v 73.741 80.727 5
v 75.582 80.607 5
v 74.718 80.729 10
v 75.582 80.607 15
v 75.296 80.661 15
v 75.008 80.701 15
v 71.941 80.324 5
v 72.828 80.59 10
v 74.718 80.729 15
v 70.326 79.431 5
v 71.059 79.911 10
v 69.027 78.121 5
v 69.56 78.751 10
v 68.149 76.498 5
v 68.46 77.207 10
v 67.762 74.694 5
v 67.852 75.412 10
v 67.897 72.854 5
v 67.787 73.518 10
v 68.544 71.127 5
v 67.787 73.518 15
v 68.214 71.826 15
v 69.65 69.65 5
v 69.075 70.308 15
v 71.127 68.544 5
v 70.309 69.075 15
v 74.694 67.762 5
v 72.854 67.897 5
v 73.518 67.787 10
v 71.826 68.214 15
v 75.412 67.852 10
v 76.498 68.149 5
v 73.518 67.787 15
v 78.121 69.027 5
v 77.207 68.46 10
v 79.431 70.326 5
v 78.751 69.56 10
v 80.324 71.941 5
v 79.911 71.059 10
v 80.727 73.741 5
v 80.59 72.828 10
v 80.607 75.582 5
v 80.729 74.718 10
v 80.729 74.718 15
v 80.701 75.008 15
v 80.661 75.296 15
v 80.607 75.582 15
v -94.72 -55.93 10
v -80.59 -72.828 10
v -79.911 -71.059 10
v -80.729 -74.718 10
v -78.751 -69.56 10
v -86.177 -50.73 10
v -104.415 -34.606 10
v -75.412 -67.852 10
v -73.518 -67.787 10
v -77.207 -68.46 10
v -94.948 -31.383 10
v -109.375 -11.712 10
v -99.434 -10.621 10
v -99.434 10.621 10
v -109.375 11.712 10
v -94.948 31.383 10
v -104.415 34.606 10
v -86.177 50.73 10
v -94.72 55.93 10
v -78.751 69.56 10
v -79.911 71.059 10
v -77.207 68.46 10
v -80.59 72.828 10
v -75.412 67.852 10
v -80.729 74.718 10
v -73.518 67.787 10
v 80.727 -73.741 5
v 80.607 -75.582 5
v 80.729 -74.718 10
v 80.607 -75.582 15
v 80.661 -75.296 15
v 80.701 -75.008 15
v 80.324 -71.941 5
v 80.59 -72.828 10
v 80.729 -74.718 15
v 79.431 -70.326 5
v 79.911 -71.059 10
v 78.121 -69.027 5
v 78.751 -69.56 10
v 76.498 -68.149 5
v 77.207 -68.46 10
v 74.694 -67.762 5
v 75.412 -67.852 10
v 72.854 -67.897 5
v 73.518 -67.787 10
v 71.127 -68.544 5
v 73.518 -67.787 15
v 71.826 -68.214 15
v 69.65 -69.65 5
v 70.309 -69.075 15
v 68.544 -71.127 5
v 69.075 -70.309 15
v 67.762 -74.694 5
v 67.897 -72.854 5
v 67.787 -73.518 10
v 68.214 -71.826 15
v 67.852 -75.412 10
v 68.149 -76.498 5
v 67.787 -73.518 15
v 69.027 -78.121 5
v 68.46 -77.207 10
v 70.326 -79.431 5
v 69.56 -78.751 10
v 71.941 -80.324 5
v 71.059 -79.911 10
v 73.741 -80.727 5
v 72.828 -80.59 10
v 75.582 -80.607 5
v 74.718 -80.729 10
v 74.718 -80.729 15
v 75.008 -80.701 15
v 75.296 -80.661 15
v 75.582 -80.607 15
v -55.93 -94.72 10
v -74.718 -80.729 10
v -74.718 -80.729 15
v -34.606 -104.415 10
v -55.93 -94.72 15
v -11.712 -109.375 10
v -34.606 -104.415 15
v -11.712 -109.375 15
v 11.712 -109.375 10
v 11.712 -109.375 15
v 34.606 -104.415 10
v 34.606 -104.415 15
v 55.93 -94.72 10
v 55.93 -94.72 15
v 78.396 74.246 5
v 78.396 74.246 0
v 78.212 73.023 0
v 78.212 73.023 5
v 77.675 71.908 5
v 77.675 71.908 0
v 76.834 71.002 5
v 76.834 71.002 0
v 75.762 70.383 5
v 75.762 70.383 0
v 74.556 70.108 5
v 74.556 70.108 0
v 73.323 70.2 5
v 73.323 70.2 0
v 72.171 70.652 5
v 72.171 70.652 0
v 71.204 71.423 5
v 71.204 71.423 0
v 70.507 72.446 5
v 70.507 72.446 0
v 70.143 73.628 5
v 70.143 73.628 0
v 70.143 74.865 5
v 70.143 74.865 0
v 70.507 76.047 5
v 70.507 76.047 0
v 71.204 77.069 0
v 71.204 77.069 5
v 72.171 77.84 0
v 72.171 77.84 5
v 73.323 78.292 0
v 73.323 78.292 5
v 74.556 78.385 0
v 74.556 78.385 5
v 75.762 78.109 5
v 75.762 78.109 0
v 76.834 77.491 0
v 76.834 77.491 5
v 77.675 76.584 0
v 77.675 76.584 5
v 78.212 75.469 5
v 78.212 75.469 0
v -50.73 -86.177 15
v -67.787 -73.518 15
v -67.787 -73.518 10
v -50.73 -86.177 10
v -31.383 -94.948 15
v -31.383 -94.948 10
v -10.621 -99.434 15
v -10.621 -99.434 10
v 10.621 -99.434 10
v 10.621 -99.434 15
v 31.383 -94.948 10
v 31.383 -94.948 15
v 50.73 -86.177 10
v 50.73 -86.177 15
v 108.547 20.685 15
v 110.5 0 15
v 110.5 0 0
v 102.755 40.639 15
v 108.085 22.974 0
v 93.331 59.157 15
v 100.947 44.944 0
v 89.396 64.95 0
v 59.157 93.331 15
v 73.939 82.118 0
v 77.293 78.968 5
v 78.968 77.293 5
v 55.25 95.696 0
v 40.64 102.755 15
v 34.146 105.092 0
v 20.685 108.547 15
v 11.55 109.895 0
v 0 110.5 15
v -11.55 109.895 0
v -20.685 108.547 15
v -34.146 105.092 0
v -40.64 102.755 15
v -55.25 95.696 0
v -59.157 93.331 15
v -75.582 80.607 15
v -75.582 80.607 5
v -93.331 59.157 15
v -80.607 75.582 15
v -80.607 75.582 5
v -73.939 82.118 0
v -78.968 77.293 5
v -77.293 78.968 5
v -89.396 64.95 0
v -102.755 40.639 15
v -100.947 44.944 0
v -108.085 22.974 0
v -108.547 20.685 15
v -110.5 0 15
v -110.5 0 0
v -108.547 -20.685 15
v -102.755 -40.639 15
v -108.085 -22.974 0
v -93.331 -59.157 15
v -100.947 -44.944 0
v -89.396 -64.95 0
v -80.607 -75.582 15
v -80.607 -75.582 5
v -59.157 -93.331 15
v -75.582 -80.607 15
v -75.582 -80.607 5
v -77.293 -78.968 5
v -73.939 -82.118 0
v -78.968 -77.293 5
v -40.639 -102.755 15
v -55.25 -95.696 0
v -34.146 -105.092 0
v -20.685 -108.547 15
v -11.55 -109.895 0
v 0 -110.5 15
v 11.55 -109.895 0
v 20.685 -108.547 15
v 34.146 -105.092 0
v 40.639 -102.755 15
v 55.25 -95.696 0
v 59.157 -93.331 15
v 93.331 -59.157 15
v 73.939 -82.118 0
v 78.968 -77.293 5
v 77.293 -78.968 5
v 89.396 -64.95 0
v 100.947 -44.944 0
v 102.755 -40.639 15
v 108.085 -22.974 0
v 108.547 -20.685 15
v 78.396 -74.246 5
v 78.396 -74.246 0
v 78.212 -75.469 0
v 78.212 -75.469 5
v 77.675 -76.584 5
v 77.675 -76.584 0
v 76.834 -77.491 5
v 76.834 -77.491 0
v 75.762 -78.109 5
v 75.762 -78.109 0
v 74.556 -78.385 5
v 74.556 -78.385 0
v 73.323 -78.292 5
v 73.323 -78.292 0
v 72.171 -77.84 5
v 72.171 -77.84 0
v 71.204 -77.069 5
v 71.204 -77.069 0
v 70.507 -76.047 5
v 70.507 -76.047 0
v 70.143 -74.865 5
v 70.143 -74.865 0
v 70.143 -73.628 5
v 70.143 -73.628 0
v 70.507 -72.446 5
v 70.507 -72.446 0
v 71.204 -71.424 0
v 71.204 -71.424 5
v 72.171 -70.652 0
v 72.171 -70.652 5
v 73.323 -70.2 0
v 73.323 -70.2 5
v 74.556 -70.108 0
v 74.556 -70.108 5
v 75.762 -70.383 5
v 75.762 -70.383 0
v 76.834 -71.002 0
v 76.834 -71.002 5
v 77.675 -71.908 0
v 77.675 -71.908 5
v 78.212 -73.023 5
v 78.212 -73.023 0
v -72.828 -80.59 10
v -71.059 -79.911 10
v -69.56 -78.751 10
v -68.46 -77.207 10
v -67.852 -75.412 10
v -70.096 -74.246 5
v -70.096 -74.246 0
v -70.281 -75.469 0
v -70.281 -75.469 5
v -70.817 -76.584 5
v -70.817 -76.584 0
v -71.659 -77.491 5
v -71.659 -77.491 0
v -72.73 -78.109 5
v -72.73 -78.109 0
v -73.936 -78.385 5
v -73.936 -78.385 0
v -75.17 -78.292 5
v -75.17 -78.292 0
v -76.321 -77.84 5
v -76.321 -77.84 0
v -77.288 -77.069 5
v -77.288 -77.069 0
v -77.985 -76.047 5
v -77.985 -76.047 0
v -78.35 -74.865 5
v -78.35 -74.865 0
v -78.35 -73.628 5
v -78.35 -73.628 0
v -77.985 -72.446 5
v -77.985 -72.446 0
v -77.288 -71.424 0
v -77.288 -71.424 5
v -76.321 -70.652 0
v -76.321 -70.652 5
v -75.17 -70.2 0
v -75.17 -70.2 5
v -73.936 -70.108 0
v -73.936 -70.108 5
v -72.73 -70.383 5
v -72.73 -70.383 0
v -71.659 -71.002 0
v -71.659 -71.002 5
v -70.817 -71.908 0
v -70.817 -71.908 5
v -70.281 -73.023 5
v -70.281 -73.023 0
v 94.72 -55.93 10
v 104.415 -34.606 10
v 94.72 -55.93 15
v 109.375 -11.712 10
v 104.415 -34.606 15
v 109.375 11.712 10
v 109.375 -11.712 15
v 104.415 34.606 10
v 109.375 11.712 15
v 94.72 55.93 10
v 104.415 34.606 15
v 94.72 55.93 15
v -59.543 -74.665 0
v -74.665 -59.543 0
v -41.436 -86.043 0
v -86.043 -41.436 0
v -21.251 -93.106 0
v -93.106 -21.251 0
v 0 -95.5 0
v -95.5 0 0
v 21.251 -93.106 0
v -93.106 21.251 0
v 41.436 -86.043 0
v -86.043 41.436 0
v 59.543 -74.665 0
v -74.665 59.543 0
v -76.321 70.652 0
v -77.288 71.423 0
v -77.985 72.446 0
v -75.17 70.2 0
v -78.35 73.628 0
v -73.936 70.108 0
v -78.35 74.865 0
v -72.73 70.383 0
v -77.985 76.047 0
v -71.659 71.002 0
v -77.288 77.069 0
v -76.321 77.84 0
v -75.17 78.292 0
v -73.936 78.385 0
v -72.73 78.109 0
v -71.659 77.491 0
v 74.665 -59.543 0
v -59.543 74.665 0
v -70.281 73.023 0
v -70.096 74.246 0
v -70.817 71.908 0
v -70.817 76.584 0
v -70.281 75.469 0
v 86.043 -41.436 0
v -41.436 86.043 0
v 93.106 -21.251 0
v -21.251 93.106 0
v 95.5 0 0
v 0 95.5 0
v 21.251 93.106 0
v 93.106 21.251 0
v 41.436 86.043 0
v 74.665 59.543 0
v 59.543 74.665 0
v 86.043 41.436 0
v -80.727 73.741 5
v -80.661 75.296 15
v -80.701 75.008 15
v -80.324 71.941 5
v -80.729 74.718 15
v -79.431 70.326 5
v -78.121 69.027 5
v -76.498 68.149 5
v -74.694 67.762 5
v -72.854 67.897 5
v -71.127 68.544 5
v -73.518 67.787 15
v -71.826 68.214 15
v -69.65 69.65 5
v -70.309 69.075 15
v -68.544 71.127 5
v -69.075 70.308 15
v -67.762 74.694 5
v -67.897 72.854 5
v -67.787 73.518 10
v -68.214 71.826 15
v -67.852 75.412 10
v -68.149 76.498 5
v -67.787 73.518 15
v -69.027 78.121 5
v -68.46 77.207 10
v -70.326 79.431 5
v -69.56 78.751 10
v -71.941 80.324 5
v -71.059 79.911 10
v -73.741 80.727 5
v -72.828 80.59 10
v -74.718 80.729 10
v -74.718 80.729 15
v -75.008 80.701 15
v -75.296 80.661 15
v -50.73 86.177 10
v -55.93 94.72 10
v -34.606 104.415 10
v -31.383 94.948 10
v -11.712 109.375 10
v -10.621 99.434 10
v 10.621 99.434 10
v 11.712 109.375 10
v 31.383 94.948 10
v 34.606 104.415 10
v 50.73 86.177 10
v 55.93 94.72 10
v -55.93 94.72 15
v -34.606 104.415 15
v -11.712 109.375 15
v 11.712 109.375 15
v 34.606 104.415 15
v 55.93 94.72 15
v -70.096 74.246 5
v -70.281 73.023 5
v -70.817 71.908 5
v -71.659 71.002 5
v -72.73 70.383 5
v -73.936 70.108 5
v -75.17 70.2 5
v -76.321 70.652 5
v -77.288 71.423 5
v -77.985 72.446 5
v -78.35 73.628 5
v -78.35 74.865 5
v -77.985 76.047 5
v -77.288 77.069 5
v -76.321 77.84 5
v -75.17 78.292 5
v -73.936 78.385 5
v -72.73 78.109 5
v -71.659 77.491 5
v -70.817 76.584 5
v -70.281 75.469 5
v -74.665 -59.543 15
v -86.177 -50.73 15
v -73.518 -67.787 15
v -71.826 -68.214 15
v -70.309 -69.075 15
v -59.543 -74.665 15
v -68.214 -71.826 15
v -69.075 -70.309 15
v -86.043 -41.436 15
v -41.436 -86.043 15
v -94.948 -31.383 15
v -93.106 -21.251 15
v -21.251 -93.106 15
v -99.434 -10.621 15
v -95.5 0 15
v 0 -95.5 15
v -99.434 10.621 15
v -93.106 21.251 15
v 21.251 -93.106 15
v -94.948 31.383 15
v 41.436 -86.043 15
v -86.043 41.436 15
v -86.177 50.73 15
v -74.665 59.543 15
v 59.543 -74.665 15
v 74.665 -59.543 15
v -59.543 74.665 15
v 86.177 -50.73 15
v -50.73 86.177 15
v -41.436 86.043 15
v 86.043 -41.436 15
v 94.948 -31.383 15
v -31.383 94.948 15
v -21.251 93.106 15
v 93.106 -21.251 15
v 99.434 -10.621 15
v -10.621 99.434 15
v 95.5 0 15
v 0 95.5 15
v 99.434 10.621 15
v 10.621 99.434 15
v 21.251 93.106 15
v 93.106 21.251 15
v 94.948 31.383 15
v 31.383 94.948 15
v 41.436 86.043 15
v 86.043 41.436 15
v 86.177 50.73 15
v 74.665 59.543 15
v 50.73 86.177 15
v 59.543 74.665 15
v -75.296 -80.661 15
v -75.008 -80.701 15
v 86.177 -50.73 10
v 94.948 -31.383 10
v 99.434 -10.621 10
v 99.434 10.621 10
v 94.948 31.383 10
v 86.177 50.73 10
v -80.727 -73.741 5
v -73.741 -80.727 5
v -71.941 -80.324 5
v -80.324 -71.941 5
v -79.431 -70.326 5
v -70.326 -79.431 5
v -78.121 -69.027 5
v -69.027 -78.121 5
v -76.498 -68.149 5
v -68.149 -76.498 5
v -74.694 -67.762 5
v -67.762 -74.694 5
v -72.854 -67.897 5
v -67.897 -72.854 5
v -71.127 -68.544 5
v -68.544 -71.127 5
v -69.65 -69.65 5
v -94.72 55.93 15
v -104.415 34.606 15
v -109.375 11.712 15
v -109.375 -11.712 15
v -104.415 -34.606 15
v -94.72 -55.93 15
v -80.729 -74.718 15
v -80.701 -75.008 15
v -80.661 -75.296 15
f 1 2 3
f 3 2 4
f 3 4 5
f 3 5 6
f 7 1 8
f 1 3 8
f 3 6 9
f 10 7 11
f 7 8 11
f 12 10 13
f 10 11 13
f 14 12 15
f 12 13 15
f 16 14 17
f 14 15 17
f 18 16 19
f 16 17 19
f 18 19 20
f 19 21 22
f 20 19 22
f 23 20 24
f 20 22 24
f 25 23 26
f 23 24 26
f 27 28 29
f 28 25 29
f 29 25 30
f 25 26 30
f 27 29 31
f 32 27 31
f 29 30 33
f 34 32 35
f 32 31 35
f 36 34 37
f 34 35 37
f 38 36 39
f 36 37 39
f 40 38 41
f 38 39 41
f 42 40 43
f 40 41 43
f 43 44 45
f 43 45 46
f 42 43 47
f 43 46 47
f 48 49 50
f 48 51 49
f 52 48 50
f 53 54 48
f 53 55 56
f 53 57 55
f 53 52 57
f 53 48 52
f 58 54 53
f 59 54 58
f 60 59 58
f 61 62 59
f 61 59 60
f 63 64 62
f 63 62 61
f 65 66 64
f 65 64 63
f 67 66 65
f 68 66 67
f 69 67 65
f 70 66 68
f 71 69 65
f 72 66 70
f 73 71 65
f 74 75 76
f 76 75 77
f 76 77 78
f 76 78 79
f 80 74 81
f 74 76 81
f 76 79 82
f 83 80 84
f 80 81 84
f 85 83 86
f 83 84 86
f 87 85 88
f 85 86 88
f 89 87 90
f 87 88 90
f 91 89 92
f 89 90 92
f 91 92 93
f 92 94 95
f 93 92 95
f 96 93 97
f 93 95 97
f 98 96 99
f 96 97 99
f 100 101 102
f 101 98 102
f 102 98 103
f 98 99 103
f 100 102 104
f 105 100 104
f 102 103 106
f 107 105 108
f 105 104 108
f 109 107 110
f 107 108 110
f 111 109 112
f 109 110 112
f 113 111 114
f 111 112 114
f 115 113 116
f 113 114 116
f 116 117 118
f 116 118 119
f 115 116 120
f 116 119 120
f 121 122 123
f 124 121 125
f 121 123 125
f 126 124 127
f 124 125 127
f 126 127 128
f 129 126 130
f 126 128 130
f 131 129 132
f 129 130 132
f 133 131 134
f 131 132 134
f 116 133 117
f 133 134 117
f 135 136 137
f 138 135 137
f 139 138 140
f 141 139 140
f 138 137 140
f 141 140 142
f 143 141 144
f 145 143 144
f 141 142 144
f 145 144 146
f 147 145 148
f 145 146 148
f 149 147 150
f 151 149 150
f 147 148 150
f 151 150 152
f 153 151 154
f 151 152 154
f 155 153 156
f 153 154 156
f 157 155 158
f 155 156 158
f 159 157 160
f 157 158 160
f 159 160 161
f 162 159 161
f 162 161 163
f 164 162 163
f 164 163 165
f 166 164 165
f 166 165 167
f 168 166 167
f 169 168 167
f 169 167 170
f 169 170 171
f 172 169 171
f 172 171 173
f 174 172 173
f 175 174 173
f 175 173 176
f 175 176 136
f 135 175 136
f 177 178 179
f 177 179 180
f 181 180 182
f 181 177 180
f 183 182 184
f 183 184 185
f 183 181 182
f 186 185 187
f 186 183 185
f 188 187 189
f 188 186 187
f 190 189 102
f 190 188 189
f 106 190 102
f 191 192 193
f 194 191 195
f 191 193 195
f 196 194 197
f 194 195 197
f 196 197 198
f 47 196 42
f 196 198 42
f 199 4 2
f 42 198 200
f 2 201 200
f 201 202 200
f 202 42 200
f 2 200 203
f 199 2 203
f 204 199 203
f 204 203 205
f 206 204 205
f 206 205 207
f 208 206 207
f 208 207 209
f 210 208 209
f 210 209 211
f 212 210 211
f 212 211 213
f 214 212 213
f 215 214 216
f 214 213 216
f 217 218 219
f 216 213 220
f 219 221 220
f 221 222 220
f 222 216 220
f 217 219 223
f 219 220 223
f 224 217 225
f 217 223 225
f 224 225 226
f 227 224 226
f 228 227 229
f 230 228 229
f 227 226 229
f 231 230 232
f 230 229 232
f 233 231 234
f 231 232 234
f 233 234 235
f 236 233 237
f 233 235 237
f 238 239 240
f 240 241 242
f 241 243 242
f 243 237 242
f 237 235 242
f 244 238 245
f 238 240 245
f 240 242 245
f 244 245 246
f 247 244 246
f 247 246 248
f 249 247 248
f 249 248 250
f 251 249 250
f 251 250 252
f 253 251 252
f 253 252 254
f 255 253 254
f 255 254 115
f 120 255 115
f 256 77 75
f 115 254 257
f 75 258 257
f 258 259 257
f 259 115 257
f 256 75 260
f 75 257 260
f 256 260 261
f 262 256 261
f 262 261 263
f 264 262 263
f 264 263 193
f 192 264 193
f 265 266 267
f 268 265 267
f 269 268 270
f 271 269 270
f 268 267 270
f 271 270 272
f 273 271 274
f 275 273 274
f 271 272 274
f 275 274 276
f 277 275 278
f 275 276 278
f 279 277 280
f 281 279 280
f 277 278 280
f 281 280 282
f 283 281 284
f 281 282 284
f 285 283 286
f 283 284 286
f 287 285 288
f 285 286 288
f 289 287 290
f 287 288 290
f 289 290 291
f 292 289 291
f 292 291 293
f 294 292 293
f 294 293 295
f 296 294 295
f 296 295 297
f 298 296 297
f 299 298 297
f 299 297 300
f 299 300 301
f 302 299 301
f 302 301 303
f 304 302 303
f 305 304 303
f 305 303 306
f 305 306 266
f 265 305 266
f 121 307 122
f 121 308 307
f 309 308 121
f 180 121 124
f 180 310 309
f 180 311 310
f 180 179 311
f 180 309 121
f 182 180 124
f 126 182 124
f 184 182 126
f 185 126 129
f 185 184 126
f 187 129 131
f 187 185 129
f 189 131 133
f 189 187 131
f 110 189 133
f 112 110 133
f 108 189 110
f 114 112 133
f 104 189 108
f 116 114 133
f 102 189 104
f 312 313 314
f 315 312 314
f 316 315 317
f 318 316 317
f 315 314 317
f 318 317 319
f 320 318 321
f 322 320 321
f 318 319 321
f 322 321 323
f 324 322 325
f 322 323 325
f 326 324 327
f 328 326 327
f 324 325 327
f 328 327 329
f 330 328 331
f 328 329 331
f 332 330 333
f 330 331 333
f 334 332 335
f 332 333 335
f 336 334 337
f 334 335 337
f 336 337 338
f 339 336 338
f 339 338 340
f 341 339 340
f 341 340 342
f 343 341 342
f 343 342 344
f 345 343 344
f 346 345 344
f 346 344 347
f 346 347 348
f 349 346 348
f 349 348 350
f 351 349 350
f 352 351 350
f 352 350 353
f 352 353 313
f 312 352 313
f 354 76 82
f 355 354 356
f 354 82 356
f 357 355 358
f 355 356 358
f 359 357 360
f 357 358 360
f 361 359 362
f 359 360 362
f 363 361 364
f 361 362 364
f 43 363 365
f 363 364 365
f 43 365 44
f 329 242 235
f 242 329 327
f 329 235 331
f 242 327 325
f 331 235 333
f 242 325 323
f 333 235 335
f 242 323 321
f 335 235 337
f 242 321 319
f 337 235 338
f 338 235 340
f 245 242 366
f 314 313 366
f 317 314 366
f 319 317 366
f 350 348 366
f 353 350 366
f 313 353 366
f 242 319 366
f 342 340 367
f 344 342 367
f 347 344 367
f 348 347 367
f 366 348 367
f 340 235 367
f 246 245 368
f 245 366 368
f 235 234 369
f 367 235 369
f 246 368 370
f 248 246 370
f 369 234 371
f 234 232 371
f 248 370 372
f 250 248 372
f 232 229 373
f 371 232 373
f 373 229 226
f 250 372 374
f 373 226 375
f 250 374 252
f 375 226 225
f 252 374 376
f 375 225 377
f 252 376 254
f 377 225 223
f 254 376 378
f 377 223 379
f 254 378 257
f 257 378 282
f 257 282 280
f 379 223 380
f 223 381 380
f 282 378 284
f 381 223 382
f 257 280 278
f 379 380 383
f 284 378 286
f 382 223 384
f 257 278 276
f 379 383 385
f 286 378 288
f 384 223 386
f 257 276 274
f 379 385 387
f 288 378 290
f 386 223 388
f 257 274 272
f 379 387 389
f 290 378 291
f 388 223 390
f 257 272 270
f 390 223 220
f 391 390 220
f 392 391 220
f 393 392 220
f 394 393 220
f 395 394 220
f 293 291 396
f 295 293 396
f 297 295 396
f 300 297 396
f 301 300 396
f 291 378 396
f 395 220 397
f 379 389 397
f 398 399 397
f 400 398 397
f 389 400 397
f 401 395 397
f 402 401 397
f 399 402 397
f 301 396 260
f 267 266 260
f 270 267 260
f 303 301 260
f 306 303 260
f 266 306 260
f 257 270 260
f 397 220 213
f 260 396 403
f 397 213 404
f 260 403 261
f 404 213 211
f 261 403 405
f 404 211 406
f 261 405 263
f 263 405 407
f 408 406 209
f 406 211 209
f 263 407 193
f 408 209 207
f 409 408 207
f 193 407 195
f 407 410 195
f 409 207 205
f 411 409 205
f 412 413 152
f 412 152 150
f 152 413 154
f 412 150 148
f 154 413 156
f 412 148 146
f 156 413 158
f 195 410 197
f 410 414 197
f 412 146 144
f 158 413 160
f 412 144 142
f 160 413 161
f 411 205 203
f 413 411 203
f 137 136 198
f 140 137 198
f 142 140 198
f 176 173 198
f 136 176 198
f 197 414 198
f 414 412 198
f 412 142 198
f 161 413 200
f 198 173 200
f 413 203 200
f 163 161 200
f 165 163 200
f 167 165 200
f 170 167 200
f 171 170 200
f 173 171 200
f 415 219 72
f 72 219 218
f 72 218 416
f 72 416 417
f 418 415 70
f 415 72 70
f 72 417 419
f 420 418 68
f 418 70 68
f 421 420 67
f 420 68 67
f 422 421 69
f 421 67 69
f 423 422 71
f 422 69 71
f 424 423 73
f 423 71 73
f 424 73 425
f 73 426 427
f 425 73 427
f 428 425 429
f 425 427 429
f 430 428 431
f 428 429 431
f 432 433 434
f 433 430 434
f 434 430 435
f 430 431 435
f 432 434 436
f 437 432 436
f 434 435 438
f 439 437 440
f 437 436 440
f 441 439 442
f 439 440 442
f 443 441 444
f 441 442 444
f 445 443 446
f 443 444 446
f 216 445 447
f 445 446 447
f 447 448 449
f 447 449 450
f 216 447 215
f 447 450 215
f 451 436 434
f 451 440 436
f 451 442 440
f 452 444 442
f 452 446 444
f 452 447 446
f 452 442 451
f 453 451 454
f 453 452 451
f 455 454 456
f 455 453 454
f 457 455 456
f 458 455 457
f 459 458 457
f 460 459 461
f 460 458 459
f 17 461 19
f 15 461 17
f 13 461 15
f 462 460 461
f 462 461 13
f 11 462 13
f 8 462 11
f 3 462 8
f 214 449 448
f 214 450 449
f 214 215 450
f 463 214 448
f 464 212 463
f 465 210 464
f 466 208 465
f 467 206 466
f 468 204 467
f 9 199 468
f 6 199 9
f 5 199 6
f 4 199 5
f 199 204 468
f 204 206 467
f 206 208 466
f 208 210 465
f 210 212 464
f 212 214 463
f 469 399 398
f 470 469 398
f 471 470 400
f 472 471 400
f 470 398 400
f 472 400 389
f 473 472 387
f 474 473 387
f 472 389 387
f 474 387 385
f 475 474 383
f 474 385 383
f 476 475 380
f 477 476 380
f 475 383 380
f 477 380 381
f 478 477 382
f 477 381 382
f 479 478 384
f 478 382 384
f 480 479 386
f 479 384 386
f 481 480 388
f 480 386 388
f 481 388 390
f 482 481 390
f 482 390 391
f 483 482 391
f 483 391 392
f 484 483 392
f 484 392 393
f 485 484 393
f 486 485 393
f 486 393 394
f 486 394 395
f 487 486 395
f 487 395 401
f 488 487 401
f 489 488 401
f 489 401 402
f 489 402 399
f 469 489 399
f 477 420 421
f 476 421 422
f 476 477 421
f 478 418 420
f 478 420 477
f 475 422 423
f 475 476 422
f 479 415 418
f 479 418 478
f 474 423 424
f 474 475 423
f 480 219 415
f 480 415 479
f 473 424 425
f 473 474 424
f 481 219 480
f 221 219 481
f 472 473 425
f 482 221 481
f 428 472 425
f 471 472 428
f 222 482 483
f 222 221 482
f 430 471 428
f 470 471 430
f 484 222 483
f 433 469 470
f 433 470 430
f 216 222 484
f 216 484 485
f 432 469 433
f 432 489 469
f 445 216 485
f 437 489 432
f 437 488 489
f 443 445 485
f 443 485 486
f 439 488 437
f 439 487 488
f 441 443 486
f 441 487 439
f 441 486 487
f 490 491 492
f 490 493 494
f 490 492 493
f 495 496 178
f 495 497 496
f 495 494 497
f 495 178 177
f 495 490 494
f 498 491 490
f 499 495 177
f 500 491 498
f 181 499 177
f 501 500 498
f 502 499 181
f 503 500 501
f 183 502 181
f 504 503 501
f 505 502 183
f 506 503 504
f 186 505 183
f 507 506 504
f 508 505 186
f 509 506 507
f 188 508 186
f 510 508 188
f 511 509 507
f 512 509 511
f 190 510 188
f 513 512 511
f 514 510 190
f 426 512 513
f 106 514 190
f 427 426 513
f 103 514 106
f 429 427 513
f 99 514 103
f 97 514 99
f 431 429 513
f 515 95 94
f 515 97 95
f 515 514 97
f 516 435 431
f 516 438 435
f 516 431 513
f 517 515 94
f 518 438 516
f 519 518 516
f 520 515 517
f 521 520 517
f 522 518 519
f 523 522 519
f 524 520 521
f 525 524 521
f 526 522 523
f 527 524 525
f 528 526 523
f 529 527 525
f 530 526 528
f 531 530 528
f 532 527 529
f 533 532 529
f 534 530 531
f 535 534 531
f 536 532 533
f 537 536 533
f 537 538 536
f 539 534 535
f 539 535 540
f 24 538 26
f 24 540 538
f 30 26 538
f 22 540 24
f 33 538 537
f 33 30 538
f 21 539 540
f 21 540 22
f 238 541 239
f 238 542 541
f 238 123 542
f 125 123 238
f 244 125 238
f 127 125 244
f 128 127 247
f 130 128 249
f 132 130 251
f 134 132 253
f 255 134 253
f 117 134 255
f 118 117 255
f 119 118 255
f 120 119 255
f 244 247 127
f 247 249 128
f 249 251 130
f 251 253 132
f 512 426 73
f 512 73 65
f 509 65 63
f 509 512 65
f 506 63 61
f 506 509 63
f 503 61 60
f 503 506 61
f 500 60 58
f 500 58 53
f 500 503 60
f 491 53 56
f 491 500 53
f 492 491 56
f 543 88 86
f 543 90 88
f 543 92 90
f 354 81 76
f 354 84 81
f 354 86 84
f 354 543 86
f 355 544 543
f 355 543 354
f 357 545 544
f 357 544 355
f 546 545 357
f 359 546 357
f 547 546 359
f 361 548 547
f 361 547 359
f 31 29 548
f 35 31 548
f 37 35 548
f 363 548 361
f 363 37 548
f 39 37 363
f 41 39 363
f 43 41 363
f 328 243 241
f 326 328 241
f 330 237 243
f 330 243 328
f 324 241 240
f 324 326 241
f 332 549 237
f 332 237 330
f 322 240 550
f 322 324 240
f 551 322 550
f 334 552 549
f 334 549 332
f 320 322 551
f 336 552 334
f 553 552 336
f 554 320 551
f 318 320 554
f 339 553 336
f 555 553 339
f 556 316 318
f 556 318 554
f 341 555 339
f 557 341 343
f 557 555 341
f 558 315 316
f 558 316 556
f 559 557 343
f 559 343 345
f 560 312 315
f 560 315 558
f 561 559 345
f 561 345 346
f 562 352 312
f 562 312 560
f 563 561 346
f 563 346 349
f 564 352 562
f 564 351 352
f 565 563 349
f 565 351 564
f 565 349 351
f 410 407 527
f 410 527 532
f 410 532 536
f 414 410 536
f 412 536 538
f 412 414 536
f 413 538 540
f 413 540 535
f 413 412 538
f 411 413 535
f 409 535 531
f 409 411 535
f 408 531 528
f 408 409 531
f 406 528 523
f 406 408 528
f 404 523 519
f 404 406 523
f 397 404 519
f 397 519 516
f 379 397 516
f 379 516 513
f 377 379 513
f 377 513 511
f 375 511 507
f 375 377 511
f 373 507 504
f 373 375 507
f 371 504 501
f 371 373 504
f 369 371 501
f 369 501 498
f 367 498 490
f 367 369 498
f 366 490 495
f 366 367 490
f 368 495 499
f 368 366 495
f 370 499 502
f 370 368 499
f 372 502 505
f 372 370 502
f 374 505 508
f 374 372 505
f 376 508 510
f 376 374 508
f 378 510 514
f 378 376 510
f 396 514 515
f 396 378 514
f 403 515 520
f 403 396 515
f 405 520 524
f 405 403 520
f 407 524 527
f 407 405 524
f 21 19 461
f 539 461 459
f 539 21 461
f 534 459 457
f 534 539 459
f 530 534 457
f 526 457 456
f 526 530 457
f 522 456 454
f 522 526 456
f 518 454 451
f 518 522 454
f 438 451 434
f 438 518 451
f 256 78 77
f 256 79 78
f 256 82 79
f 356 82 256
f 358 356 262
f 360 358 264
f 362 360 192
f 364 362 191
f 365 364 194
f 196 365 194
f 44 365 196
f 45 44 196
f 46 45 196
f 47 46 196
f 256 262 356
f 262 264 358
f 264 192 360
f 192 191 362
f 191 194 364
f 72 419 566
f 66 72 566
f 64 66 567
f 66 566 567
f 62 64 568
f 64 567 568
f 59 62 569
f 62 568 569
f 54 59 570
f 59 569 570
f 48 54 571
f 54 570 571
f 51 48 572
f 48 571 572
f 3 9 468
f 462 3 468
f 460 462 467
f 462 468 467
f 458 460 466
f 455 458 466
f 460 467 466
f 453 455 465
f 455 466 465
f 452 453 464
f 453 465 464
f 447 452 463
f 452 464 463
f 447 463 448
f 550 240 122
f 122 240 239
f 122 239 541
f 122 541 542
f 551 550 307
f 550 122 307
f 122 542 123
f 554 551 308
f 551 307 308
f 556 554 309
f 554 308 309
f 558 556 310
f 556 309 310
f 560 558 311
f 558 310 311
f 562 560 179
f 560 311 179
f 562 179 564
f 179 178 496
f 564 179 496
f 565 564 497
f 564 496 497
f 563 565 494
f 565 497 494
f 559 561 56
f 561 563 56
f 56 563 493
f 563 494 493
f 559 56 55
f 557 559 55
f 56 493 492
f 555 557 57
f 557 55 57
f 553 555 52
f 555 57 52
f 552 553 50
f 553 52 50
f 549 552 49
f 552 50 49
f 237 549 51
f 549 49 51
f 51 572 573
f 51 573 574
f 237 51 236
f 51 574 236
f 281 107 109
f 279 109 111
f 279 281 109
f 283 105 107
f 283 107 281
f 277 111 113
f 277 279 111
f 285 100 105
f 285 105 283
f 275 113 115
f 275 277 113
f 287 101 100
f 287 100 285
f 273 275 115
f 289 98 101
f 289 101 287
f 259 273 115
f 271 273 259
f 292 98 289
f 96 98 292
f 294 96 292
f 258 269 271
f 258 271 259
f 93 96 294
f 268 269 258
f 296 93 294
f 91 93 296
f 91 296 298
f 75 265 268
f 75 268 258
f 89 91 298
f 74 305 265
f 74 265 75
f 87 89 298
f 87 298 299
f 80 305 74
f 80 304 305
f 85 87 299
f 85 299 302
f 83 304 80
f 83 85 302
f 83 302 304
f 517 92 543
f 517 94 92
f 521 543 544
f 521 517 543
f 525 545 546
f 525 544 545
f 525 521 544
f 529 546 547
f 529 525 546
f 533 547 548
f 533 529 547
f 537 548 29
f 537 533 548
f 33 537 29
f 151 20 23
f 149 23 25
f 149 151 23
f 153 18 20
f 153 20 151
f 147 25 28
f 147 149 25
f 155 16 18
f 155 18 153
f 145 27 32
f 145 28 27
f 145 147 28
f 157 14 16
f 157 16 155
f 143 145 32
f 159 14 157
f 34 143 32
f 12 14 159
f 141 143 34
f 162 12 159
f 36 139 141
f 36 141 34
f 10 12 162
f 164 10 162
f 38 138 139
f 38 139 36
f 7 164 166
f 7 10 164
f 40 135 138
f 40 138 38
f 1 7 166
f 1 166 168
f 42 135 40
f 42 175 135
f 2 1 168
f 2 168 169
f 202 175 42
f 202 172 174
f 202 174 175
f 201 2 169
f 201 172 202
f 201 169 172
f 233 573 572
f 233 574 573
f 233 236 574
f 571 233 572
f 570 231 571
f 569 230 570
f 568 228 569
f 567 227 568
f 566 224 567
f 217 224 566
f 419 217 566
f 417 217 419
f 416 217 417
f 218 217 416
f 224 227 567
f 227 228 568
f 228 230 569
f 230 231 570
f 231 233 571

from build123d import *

# Parameters (mm, degrees)
F0_R     = 110.5
F0_R_2   = 95.5
F1_DEPTH = 15
F2_R     = 110
F2_R_2   = 100
F3_DEPTH = 5
F4_R     = 4.15
F5_DEPTH = 25
F6_R     = 6.5
F7_DEPTH = 10


with BuildPart() as f1:
    # F0 (on Top) → F1 (new body)
    with BuildSketch(Plane.XY):
        Circle(F0_R)
        Circle(F0_R_2, mode=Mode.SUBTRACT)
    extrude(amount=F1_DEPTH)

    # F2 (on face) → F3 (cut)
    with BuildSketch(Plane.XY.offset(15)):
        Circle(F2_R)
        Circle(F2_R_2, mode=Mode.SUBTRACT)
    extrude(amount=-F3_DEPTH, mode=Mode.SUBTRACT)

    # F4 (on face) → F5 (cut)
    with BuildSketch(Plane(origin=(0, 0, 0), x_dir=(1, 0, 0), z_dir=(0, 0, -1))):
        with Locations((-74.2462, 74.246224)):
            Circle(F4_R)
        with Locations((-74.2462, -74.246176)):
            Circle(F4_R)
        with Locations((74.2462, 74.246224)):
            Circle(F4_R)
        with Locations((74.2462, -74.246176)):
            Circle(F4_R)
    extrude(amount=-F5_DEPTH, mode=Mode.SUBTRACT)

    # F6 (on face) → F7 (cut)
    with BuildSketch(Plane.XY.offset(15)):
        with Locations((-74.2462, 74.246176)):
            Circle(F6_R)
        with Locations((74.2462, 74.246176)):
            Circle(F6_R)
        with Locations((74.2462, -74.246224)):
            Circle(F6_R)
        with Locations((-74.2462, -74.246224)):
            Circle(F6_R)
    extrude(amount=-F7_DEPTH, mode=Mode.SUBTRACT)


solid = f1.part
